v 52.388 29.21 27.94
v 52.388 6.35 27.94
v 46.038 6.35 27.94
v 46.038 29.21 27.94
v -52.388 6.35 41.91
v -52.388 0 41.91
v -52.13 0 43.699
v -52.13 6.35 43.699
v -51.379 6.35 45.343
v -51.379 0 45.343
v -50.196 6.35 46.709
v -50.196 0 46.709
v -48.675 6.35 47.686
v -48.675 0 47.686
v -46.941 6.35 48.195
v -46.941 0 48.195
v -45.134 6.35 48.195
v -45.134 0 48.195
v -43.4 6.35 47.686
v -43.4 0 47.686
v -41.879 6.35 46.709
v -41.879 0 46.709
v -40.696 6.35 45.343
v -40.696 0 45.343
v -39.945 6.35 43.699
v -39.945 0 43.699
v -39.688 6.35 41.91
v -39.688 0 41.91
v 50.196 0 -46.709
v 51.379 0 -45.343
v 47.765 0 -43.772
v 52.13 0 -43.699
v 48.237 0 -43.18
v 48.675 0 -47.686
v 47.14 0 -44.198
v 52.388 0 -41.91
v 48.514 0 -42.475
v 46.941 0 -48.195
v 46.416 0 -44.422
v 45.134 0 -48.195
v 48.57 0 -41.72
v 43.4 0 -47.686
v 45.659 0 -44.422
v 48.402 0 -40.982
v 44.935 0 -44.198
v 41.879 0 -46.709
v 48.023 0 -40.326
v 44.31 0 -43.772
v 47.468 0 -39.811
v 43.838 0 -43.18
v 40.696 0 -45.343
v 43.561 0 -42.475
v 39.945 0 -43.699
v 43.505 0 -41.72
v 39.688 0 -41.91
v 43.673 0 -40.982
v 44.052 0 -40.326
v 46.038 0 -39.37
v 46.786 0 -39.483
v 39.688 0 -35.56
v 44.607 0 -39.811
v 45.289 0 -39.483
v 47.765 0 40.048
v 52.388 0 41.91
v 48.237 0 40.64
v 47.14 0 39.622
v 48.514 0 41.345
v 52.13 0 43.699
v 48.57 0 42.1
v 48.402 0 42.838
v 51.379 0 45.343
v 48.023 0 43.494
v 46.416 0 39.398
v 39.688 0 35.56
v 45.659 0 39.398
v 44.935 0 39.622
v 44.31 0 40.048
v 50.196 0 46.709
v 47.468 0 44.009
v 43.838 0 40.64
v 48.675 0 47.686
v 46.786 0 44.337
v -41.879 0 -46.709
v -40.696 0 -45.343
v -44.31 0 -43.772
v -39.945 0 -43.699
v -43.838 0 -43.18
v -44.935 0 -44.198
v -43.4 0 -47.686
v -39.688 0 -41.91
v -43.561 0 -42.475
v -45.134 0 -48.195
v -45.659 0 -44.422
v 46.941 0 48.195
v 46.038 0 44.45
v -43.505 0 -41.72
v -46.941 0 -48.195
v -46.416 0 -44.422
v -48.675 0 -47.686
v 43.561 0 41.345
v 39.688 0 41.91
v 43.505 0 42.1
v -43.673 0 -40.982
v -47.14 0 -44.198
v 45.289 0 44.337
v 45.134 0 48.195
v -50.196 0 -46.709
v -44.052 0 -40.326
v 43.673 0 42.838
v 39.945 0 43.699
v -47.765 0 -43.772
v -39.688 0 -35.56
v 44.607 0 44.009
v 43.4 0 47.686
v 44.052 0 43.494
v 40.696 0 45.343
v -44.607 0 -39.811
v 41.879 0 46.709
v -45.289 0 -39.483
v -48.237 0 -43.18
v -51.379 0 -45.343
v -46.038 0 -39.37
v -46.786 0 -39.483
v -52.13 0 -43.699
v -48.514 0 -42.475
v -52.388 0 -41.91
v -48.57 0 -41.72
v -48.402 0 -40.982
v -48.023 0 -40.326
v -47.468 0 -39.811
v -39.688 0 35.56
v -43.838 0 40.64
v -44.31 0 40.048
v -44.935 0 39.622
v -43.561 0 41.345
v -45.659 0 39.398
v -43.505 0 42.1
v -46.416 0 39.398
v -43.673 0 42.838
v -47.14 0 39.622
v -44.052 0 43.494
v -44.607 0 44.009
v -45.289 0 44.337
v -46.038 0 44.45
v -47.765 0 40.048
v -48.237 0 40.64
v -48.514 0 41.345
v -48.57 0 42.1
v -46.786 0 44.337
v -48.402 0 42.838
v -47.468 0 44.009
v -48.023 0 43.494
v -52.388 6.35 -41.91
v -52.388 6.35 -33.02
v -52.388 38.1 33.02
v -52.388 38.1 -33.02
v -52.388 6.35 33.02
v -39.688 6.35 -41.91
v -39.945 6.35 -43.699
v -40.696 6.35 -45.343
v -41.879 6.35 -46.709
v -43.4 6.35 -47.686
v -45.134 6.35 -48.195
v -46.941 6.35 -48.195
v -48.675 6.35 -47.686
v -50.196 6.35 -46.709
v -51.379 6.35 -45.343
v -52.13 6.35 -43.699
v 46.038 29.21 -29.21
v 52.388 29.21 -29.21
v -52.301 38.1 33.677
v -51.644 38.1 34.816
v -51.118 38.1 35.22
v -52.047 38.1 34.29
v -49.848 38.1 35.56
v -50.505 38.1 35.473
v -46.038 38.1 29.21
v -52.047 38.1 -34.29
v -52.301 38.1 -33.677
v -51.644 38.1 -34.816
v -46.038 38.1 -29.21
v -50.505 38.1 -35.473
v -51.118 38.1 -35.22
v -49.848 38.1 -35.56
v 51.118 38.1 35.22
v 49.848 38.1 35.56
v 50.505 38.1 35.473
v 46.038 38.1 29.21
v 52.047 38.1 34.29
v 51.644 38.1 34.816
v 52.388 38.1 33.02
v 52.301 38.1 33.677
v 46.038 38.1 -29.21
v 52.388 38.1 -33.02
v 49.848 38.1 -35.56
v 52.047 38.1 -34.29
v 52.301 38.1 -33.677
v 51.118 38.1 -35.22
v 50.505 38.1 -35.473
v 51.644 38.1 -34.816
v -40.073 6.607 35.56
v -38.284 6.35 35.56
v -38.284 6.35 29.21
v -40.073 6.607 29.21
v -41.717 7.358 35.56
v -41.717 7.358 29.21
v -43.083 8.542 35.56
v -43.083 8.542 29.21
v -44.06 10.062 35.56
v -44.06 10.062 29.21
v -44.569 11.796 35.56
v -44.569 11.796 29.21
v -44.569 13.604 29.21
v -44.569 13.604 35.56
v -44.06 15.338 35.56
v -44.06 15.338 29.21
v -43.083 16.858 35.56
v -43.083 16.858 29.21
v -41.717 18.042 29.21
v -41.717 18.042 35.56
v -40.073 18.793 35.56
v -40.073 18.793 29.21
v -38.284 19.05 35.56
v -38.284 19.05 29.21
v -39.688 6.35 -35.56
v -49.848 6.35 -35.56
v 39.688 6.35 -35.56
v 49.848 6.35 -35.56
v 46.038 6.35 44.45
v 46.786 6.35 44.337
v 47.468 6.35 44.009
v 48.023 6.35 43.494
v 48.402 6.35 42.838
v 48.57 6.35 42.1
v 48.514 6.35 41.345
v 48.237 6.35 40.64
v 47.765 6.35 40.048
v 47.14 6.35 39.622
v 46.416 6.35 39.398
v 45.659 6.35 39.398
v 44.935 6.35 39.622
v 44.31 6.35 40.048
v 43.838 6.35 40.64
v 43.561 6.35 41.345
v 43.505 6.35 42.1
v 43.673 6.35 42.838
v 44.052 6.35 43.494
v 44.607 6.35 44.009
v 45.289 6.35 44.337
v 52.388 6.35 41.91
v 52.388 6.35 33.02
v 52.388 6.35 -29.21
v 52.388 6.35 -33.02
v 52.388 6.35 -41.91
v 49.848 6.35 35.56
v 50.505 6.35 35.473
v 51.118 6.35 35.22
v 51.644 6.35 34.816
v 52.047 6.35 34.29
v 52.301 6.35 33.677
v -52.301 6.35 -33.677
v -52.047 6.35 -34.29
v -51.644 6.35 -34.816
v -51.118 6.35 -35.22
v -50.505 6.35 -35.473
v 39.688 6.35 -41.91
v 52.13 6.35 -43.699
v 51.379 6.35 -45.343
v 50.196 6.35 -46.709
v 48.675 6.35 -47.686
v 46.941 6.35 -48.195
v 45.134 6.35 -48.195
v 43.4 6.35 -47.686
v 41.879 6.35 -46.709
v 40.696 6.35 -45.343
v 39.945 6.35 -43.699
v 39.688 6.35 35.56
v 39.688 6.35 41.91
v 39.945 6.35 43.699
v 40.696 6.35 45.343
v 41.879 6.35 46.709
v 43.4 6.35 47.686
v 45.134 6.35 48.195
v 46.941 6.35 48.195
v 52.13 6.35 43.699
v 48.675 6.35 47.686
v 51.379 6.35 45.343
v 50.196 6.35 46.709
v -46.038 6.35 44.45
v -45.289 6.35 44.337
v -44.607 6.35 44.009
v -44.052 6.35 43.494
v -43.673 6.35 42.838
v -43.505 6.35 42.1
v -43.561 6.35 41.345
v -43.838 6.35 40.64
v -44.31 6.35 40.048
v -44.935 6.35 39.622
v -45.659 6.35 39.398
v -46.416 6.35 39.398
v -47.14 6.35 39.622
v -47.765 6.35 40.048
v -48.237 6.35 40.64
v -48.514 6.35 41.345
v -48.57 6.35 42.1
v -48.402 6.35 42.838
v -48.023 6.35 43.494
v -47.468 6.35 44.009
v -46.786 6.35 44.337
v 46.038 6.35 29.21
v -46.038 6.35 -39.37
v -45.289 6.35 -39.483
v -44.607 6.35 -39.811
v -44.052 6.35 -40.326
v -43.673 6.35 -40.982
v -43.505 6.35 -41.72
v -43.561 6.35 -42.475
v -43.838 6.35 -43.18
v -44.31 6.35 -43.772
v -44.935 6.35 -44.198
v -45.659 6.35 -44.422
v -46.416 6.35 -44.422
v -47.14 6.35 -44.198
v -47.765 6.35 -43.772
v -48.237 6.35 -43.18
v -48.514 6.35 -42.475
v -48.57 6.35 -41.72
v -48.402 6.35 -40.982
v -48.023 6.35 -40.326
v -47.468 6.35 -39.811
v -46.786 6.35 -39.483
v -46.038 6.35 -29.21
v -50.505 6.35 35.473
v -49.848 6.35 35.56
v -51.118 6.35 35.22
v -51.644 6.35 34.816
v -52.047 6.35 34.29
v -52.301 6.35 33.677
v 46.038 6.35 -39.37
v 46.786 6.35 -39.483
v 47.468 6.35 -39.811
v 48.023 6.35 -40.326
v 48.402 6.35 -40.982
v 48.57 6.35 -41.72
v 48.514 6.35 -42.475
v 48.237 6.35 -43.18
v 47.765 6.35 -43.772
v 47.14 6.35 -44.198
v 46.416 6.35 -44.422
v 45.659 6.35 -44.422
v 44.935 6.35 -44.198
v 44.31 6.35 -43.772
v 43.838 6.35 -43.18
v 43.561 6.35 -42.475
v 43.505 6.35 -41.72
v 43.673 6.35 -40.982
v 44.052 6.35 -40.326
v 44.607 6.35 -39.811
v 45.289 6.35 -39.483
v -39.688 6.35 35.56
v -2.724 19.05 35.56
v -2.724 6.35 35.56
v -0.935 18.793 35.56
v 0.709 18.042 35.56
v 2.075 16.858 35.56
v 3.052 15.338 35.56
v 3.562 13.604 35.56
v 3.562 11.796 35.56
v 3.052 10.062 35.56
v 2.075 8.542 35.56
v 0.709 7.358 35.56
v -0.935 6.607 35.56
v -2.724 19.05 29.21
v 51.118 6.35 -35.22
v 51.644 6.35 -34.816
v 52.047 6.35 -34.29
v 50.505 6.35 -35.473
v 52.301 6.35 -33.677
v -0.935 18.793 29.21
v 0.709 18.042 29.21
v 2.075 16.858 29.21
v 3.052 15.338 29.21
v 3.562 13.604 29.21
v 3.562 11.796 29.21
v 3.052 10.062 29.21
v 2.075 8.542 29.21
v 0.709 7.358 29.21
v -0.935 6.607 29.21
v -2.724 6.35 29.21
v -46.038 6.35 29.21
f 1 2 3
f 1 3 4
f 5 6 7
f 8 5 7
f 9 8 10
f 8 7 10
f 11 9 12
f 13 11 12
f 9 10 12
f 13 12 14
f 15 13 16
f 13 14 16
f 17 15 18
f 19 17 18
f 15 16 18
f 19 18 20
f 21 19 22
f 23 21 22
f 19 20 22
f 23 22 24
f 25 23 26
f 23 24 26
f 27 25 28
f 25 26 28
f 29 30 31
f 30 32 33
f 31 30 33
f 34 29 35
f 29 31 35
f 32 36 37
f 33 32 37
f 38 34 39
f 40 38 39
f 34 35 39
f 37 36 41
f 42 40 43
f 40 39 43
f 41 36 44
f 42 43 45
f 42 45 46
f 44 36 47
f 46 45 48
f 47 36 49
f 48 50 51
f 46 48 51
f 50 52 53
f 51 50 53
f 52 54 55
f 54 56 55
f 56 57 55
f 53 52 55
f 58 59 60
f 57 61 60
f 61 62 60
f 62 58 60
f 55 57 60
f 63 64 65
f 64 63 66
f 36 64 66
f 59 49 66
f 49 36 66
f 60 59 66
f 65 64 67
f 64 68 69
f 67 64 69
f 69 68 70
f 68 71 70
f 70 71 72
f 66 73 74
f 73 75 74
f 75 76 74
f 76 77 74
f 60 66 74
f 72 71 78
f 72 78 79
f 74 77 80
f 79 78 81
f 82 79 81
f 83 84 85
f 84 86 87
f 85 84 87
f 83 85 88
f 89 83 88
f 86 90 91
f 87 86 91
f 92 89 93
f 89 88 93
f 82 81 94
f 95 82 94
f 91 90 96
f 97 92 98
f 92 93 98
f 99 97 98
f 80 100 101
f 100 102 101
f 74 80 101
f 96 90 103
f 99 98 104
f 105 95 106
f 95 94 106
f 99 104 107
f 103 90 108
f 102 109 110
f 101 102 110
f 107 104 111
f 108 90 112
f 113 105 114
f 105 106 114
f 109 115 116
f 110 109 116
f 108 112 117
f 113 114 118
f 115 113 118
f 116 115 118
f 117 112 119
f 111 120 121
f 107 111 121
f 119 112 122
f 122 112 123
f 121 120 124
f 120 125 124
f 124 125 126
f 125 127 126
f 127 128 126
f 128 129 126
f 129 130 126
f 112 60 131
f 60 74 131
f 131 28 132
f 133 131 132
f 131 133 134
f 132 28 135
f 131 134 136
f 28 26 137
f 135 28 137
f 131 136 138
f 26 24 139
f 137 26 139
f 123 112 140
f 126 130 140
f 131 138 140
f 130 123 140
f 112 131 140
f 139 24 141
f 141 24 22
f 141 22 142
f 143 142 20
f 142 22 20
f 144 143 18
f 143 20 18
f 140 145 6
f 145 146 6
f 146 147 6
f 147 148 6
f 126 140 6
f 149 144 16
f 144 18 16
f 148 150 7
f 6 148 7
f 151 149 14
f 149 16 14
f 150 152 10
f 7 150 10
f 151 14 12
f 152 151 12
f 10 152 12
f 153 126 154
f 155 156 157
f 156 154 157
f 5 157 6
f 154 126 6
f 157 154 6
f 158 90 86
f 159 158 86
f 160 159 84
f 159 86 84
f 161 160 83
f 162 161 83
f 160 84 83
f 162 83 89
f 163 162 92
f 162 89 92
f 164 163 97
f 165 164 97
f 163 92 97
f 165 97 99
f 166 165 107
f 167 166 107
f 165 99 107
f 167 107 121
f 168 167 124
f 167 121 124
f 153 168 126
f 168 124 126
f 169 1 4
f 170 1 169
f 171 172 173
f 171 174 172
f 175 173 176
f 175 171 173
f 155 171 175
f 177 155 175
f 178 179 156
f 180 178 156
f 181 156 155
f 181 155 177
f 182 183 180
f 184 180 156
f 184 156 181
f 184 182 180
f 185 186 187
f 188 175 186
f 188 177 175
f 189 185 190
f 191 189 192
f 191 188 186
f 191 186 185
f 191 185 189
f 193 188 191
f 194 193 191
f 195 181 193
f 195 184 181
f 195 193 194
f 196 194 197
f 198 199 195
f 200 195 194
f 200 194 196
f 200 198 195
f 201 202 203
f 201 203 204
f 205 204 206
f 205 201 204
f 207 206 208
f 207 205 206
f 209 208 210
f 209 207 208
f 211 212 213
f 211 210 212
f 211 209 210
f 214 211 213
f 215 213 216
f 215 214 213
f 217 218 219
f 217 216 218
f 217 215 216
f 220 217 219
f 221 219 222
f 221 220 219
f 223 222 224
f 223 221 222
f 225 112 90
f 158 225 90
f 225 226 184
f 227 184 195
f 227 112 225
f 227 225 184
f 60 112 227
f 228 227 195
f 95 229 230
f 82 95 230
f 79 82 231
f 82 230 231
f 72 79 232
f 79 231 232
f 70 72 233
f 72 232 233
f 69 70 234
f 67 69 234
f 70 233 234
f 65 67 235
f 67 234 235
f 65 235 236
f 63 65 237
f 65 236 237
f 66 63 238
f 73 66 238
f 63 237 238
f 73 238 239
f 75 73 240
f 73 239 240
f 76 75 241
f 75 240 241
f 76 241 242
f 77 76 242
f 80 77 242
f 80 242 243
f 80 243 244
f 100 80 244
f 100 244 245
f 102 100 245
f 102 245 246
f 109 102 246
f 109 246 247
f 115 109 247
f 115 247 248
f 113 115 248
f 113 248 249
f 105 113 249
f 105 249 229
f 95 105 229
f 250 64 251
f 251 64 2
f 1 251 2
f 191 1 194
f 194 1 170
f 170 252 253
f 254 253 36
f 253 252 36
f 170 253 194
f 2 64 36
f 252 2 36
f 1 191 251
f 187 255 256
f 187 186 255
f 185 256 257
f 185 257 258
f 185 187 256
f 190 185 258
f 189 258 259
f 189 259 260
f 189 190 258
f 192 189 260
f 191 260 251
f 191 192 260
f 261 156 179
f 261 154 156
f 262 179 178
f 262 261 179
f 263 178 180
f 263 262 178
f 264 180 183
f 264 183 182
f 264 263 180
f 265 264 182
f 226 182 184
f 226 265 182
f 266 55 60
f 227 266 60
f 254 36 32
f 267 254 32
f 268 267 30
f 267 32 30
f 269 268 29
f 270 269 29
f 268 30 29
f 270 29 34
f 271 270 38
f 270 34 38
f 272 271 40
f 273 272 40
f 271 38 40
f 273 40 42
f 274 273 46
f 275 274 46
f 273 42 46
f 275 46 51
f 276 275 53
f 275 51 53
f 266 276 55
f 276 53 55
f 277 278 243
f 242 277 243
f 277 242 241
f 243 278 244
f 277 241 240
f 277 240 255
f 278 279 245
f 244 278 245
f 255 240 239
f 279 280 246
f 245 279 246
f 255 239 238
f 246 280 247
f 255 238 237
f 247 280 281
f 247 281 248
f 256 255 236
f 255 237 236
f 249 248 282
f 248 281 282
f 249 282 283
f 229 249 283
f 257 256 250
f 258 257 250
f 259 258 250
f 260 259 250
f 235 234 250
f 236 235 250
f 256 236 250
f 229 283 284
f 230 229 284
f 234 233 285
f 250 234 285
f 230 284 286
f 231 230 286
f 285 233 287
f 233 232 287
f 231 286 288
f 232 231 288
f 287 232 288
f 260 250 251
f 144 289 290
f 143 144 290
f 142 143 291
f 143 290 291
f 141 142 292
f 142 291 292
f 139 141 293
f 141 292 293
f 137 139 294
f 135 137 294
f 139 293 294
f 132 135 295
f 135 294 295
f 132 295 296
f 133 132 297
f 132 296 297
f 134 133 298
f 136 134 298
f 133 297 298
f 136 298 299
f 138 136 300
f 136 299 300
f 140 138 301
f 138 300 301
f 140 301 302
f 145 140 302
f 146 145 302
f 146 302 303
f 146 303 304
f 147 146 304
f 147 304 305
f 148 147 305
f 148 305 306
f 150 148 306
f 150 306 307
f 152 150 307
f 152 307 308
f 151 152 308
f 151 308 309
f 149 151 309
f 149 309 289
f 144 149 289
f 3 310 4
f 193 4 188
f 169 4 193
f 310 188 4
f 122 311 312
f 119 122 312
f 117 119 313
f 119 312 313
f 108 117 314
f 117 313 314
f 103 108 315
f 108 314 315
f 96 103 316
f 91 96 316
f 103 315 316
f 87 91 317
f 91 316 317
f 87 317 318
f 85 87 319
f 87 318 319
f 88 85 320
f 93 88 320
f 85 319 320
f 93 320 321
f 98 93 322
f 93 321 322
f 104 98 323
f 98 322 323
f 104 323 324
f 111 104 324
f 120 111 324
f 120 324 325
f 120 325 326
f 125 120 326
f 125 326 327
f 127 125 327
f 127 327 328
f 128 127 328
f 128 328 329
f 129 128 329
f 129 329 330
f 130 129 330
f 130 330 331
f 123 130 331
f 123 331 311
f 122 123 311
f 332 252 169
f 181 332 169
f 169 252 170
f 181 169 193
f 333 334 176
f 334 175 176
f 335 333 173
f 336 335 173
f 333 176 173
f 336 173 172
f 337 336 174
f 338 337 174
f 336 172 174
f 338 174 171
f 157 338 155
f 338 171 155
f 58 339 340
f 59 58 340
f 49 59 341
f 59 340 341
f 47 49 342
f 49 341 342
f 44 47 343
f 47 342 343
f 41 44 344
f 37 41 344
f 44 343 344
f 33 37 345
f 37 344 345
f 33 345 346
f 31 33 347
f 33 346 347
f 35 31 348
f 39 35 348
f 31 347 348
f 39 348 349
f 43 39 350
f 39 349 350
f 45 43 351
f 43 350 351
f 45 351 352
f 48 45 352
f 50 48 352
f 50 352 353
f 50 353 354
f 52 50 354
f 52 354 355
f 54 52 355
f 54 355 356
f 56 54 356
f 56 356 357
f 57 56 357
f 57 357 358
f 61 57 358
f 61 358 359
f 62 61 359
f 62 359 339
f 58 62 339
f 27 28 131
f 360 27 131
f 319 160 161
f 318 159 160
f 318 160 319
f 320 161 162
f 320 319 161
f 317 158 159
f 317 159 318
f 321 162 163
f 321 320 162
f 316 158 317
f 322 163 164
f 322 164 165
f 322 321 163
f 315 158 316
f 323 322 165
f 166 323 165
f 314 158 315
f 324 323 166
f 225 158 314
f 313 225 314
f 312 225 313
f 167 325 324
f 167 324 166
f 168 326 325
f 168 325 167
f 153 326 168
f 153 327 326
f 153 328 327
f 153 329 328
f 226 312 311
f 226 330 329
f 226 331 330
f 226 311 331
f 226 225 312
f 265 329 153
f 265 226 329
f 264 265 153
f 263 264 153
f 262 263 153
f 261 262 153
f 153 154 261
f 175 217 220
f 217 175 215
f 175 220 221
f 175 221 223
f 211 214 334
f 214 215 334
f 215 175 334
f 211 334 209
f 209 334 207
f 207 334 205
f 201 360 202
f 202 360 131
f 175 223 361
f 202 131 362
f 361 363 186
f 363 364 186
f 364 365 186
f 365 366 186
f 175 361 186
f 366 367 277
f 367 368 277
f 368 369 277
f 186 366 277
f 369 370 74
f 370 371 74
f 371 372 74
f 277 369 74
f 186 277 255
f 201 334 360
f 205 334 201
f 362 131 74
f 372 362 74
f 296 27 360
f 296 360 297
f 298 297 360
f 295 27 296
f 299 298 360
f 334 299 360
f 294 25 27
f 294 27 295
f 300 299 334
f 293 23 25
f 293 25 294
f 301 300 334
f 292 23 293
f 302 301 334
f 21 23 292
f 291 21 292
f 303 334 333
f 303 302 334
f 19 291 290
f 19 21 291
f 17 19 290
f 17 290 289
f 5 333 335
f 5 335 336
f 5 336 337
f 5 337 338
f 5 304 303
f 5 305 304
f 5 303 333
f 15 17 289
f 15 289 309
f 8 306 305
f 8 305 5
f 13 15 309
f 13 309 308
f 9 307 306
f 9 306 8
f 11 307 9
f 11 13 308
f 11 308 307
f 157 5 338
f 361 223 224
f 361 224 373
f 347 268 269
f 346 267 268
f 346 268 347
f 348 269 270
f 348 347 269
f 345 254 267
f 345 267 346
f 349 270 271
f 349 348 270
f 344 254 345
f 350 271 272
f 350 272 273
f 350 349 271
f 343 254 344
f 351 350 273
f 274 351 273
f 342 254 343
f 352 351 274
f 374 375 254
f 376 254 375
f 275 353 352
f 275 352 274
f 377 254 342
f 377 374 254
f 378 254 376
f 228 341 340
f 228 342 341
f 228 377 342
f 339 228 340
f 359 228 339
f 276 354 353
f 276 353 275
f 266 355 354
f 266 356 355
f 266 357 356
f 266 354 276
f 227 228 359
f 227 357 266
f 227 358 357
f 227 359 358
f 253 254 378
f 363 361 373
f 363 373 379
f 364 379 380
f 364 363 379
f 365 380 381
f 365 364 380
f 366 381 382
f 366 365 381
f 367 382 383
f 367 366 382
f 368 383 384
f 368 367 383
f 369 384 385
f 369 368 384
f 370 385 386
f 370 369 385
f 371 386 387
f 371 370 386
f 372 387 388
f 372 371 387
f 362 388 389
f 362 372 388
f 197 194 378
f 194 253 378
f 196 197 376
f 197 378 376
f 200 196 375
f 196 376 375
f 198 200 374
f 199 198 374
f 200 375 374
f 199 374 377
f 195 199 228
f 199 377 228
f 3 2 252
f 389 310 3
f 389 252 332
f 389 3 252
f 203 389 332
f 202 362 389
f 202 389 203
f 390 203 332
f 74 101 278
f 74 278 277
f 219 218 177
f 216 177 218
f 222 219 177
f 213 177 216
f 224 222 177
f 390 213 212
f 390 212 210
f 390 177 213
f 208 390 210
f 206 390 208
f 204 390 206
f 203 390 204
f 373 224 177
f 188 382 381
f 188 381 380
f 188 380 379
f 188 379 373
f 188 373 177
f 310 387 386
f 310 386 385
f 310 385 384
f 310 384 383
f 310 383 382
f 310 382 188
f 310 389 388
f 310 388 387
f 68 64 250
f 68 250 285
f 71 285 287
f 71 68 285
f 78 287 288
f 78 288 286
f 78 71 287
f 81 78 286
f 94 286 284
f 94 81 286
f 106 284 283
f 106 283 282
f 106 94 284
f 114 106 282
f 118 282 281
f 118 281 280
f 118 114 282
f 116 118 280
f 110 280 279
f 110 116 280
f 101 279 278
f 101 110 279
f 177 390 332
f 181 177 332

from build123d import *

# Parameters (mm, degrees)
SKETCH1_W           = 104.775
SKETCH1_H           = 71.12
BOSS_EXTRUDE1_DEPTH = 6.35
SKETCH1_3_W         = 104.775
SKETCH1_3_H         = 71.12
SKETCH1_3_W_2       = 92.075
SKETCH1_3_H_2       = 58.42
BOSS_EXTRUDE2_DEPTH = 38.1
CUT_EXTRUDE1_REACH  = 98.198
CUT_EXTRUDE2_REACH  = 119.021
SKETCH3_W           = 57.15
SKETCH3_H           = 22.86
BOSS_EXTRUDE3_DEPTH = 6.35
CUT_EXTRUDE3_REACH  = 79.984
SKETCH5_R           = 2.54
FILLET1_R           = 2.54


with BuildPart() as part:
    # Sketch1 → Boss-Extrude1 (new body)
    with BuildSketch(Plane(origin=(0, 0, 0), x_dir=(1, 0, 0), z_dir=(0, 1, 0))):
        Rectangle(SKETCH1_W, SKETCH1_H)
    extrude(amount=BOSS_EXTRUDE1_DEPTH)

    # Sketch1<3> → Boss-Extrude2 (add)
    with BuildSketch(Plane(origin=(0, 0, 0), x_dir=(1, 0, 0), z_dir=(0, 1, 0))):
        Rectangle(SKETCH1_3_W, SKETCH1_3_H)
        Rectangle(SKETCH1_3_W_2, SKETCH1_3_H_2, mode=Mode.SUBTRACT)
    extrude(amount=BOSS_EXTRUDE2_DEPTH)

    # Sketch2 → Cut-Extrude1 (cut, up to next)
    with BuildSketch(Plane.XY.offset(35.56), mode=Mode.PRIVATE) as cut_extrude1_sk1:
        with BuildLine():
            Line((-38.283663242, 19.05), (-2.723663242, 19.05))
            ThreePointArc((-2.723663242, 19.05), (3.626336758, 12.7), (-2.723663242, 6.35))
            Line((-2.723663242, 6.35), (-38.283663242, 6.35))
            ThreePointArc((-38.283663242, 6.35), (-44.633663242, 12.7), (-38.283663242, 19.05))
        make_face()
    cut_extrude1_tool1 = extrude(cut_extrude1_sk1.sketch, amount=-CUT_EXTRUDE1_REACH, mode=Mode.PRIVATE) & part.part
    add(cut_extrude1_tool1.solids().sort_by_distance((-20.503663, 12.7, 35.56))[0], mode=Mode.SUBTRACT)

    # Sketch3 → Cut-Extrude2 (cut, up to next)
    with BuildSketch(Plane(origin=(52.3875, 0, 0), x_dir=(0, 0, -1), z_dir=(1, 0, 0)), mode=Mode.PRIVATE) as cut_extrude2_sk1:
        with Locations((0.635, 17.78)):
            Rectangle(SKETCH3_W, SKETCH3_H)
    cut_extrude2_tool1 = extrude(cut_extrude2_sk1.sketch, amount=-CUT_EXTRUDE2_REACH, mode=Mode.PRIVATE) & part.part
    add(cut_extrude2_tool1.solids().sort_by_distance((52.3875, 17.78, -0.635))[0], mode=Mode.SUBTRACT)

    # Sketch4 → Boss-Extrude3 (add)
    with BuildSketch(Plane.XZ):
        with BuildLine():
            Line((-39.6875, 41.91), (-39.6875, 35.56))
            Line((-39.6875, 35.56), (-52.3875, 35.56))
            Line((-52.3875, 35.56), (-52.3875, 41.91))
            ThreePointArc((-52.3875, 41.91), (-46.0375, 48.26), (-39.6875, 41.91))
        make_face()
        with BuildLine():
            Line((39.6875, 41.91), (39.6875, 35.56))
            Line((39.6875, 35.56), (52.3875, 35.56))
            Line((52.3875, 35.56), (52.3875, 41.91))
            ThreePointArc((52.3875, 41.91), (46.0375, 48.26), (39.6875, 41.91))
        make_face()
        with BuildLine():
            Line((-52.3875, -41.91), (-52.3875, -35.56))
            Line((-52.3875, -35.56), (-39.6875, -35.56))
            Line((-39.6875, -35.56), (-39.6875, -41.91))
            ThreePointArc((-39.6875, -41.91), (-46.0375, -48.26), (-52.3875, -41.91))
        make_face()
        with BuildLine():
            Line((39.6875, -41.91), (39.6875, -35.56))
            Line((39.6875, -35.56), (52.3875, -35.56))
            Line((52.3875, -35.56), (52.3875, -41.91))
            ThreePointArc((52.3875, -41.91), (46.0375, -48.26), (39.6875, -41.91))
        make_face()
    extrude(amount=-BOSS_EXTRUDE3_DEPTH)

    # Sketch5 → Cut-Extrude3 (cut, up to next)
    with BuildSketch(Plane(origin=(0, 6.35, 0), x_dir=(1, 0, 0), z_dir=(0, 1, 0)), mode=Mode.PRIVATE) as cut_extrude3_sk1:
        with Locations((-46.0375, 41.91)):
            Circle(SKETCH5_R)
    cut_extrude3_tool1 = extrude(cut_extrude3_sk1.sketch, amount=-CUT_EXTRUDE3_REACH, mode=Mode.PRIVATE) & part.part
    # Sketch5 → Cut-Extrude3 (cut, up to next)
    with BuildSketch(Plane(origin=(0, 6.35, 0), x_dir=(1, 0, 0), z_dir=(0, 1, 0)), mode=Mode.PRIVATE) as cut_extrude3_sk2:
        with Locations((46.0375, 41.91)):
            Circle(SKETCH5_R)
    cut_extrude3_tool2 = extrude(cut_extrude3_sk2.sketch, amount=-CUT_EXTRUDE3_REACH, mode=Mode.PRIVATE) & part.part
    # Sketch5 → Cut-Extrude3 (cut, up to next)
    with BuildSketch(Plane(origin=(0, 6.35, 0), x_dir=(1, 0, 0), z_dir=(0, 1, 0)), mode=Mode.PRIVATE) as cut_extrude3_sk3:
        with Locations((46.0375, -41.91)):
            Circle(SKETCH5_R)
    cut_extrude3_tool3 = extrude(cut_extrude3_sk3.sketch, amount=-CUT_EXTRUDE3_REACH, mode=Mode.PRIVATE) & part.part
    # Sketch5 → Cut-Extrude3 (cut, up to next)
    with BuildSketch(Plane(origin=(0, 6.35, 0), x_dir=(1, 0, 0), z_dir=(0, 1, 0)), mode=Mode.PRIVATE) as cut_extrude3_sk4:
        with Locations((-46.0375, -41.91)):
            Circle(SKETCH5_R)
    cut_extrude3_tool4 = extrude(cut_extrude3_sk4.sketch, amount=-CUT_EXTRUDE3_REACH, mode=Mode.PRIVATE) & part.part
    add(cut_extrude3_tool1.solids().sort_by_distance((-46.0375, 6.35, -41.91))[0], mode=Mode.SUBTRACT)
    add(cut_extrude3_tool2.solids().sort_by_distance((46.0375, 6.35, -41.91))[0], mode=Mode.SUBTRACT)
    add(cut_extrude3_tool3.solids().sort_by_distance((46.0375, 6.35, 41.91))[0], mode=Mode.SUBTRACT)
    add(cut_extrude3_tool4.solids().sort_by_distance((-46.0375, 6.35, 41.91))[0], mode=Mode.SUBTRACT)

    # Fillet1
    fillet1_edges = [part.edges().sort_by_distance(p)[0] for p in [
        (52.3875, 22.225, -35.56),
        (52.3875, 22.225, 35.56),
        (-52.3875, 22.225, -35.56),
        (-52.3875, 22.225, 35.56),
    ]]
    fillet(fillet1_edges, radius=FILLET1_R)


solid = part.part
